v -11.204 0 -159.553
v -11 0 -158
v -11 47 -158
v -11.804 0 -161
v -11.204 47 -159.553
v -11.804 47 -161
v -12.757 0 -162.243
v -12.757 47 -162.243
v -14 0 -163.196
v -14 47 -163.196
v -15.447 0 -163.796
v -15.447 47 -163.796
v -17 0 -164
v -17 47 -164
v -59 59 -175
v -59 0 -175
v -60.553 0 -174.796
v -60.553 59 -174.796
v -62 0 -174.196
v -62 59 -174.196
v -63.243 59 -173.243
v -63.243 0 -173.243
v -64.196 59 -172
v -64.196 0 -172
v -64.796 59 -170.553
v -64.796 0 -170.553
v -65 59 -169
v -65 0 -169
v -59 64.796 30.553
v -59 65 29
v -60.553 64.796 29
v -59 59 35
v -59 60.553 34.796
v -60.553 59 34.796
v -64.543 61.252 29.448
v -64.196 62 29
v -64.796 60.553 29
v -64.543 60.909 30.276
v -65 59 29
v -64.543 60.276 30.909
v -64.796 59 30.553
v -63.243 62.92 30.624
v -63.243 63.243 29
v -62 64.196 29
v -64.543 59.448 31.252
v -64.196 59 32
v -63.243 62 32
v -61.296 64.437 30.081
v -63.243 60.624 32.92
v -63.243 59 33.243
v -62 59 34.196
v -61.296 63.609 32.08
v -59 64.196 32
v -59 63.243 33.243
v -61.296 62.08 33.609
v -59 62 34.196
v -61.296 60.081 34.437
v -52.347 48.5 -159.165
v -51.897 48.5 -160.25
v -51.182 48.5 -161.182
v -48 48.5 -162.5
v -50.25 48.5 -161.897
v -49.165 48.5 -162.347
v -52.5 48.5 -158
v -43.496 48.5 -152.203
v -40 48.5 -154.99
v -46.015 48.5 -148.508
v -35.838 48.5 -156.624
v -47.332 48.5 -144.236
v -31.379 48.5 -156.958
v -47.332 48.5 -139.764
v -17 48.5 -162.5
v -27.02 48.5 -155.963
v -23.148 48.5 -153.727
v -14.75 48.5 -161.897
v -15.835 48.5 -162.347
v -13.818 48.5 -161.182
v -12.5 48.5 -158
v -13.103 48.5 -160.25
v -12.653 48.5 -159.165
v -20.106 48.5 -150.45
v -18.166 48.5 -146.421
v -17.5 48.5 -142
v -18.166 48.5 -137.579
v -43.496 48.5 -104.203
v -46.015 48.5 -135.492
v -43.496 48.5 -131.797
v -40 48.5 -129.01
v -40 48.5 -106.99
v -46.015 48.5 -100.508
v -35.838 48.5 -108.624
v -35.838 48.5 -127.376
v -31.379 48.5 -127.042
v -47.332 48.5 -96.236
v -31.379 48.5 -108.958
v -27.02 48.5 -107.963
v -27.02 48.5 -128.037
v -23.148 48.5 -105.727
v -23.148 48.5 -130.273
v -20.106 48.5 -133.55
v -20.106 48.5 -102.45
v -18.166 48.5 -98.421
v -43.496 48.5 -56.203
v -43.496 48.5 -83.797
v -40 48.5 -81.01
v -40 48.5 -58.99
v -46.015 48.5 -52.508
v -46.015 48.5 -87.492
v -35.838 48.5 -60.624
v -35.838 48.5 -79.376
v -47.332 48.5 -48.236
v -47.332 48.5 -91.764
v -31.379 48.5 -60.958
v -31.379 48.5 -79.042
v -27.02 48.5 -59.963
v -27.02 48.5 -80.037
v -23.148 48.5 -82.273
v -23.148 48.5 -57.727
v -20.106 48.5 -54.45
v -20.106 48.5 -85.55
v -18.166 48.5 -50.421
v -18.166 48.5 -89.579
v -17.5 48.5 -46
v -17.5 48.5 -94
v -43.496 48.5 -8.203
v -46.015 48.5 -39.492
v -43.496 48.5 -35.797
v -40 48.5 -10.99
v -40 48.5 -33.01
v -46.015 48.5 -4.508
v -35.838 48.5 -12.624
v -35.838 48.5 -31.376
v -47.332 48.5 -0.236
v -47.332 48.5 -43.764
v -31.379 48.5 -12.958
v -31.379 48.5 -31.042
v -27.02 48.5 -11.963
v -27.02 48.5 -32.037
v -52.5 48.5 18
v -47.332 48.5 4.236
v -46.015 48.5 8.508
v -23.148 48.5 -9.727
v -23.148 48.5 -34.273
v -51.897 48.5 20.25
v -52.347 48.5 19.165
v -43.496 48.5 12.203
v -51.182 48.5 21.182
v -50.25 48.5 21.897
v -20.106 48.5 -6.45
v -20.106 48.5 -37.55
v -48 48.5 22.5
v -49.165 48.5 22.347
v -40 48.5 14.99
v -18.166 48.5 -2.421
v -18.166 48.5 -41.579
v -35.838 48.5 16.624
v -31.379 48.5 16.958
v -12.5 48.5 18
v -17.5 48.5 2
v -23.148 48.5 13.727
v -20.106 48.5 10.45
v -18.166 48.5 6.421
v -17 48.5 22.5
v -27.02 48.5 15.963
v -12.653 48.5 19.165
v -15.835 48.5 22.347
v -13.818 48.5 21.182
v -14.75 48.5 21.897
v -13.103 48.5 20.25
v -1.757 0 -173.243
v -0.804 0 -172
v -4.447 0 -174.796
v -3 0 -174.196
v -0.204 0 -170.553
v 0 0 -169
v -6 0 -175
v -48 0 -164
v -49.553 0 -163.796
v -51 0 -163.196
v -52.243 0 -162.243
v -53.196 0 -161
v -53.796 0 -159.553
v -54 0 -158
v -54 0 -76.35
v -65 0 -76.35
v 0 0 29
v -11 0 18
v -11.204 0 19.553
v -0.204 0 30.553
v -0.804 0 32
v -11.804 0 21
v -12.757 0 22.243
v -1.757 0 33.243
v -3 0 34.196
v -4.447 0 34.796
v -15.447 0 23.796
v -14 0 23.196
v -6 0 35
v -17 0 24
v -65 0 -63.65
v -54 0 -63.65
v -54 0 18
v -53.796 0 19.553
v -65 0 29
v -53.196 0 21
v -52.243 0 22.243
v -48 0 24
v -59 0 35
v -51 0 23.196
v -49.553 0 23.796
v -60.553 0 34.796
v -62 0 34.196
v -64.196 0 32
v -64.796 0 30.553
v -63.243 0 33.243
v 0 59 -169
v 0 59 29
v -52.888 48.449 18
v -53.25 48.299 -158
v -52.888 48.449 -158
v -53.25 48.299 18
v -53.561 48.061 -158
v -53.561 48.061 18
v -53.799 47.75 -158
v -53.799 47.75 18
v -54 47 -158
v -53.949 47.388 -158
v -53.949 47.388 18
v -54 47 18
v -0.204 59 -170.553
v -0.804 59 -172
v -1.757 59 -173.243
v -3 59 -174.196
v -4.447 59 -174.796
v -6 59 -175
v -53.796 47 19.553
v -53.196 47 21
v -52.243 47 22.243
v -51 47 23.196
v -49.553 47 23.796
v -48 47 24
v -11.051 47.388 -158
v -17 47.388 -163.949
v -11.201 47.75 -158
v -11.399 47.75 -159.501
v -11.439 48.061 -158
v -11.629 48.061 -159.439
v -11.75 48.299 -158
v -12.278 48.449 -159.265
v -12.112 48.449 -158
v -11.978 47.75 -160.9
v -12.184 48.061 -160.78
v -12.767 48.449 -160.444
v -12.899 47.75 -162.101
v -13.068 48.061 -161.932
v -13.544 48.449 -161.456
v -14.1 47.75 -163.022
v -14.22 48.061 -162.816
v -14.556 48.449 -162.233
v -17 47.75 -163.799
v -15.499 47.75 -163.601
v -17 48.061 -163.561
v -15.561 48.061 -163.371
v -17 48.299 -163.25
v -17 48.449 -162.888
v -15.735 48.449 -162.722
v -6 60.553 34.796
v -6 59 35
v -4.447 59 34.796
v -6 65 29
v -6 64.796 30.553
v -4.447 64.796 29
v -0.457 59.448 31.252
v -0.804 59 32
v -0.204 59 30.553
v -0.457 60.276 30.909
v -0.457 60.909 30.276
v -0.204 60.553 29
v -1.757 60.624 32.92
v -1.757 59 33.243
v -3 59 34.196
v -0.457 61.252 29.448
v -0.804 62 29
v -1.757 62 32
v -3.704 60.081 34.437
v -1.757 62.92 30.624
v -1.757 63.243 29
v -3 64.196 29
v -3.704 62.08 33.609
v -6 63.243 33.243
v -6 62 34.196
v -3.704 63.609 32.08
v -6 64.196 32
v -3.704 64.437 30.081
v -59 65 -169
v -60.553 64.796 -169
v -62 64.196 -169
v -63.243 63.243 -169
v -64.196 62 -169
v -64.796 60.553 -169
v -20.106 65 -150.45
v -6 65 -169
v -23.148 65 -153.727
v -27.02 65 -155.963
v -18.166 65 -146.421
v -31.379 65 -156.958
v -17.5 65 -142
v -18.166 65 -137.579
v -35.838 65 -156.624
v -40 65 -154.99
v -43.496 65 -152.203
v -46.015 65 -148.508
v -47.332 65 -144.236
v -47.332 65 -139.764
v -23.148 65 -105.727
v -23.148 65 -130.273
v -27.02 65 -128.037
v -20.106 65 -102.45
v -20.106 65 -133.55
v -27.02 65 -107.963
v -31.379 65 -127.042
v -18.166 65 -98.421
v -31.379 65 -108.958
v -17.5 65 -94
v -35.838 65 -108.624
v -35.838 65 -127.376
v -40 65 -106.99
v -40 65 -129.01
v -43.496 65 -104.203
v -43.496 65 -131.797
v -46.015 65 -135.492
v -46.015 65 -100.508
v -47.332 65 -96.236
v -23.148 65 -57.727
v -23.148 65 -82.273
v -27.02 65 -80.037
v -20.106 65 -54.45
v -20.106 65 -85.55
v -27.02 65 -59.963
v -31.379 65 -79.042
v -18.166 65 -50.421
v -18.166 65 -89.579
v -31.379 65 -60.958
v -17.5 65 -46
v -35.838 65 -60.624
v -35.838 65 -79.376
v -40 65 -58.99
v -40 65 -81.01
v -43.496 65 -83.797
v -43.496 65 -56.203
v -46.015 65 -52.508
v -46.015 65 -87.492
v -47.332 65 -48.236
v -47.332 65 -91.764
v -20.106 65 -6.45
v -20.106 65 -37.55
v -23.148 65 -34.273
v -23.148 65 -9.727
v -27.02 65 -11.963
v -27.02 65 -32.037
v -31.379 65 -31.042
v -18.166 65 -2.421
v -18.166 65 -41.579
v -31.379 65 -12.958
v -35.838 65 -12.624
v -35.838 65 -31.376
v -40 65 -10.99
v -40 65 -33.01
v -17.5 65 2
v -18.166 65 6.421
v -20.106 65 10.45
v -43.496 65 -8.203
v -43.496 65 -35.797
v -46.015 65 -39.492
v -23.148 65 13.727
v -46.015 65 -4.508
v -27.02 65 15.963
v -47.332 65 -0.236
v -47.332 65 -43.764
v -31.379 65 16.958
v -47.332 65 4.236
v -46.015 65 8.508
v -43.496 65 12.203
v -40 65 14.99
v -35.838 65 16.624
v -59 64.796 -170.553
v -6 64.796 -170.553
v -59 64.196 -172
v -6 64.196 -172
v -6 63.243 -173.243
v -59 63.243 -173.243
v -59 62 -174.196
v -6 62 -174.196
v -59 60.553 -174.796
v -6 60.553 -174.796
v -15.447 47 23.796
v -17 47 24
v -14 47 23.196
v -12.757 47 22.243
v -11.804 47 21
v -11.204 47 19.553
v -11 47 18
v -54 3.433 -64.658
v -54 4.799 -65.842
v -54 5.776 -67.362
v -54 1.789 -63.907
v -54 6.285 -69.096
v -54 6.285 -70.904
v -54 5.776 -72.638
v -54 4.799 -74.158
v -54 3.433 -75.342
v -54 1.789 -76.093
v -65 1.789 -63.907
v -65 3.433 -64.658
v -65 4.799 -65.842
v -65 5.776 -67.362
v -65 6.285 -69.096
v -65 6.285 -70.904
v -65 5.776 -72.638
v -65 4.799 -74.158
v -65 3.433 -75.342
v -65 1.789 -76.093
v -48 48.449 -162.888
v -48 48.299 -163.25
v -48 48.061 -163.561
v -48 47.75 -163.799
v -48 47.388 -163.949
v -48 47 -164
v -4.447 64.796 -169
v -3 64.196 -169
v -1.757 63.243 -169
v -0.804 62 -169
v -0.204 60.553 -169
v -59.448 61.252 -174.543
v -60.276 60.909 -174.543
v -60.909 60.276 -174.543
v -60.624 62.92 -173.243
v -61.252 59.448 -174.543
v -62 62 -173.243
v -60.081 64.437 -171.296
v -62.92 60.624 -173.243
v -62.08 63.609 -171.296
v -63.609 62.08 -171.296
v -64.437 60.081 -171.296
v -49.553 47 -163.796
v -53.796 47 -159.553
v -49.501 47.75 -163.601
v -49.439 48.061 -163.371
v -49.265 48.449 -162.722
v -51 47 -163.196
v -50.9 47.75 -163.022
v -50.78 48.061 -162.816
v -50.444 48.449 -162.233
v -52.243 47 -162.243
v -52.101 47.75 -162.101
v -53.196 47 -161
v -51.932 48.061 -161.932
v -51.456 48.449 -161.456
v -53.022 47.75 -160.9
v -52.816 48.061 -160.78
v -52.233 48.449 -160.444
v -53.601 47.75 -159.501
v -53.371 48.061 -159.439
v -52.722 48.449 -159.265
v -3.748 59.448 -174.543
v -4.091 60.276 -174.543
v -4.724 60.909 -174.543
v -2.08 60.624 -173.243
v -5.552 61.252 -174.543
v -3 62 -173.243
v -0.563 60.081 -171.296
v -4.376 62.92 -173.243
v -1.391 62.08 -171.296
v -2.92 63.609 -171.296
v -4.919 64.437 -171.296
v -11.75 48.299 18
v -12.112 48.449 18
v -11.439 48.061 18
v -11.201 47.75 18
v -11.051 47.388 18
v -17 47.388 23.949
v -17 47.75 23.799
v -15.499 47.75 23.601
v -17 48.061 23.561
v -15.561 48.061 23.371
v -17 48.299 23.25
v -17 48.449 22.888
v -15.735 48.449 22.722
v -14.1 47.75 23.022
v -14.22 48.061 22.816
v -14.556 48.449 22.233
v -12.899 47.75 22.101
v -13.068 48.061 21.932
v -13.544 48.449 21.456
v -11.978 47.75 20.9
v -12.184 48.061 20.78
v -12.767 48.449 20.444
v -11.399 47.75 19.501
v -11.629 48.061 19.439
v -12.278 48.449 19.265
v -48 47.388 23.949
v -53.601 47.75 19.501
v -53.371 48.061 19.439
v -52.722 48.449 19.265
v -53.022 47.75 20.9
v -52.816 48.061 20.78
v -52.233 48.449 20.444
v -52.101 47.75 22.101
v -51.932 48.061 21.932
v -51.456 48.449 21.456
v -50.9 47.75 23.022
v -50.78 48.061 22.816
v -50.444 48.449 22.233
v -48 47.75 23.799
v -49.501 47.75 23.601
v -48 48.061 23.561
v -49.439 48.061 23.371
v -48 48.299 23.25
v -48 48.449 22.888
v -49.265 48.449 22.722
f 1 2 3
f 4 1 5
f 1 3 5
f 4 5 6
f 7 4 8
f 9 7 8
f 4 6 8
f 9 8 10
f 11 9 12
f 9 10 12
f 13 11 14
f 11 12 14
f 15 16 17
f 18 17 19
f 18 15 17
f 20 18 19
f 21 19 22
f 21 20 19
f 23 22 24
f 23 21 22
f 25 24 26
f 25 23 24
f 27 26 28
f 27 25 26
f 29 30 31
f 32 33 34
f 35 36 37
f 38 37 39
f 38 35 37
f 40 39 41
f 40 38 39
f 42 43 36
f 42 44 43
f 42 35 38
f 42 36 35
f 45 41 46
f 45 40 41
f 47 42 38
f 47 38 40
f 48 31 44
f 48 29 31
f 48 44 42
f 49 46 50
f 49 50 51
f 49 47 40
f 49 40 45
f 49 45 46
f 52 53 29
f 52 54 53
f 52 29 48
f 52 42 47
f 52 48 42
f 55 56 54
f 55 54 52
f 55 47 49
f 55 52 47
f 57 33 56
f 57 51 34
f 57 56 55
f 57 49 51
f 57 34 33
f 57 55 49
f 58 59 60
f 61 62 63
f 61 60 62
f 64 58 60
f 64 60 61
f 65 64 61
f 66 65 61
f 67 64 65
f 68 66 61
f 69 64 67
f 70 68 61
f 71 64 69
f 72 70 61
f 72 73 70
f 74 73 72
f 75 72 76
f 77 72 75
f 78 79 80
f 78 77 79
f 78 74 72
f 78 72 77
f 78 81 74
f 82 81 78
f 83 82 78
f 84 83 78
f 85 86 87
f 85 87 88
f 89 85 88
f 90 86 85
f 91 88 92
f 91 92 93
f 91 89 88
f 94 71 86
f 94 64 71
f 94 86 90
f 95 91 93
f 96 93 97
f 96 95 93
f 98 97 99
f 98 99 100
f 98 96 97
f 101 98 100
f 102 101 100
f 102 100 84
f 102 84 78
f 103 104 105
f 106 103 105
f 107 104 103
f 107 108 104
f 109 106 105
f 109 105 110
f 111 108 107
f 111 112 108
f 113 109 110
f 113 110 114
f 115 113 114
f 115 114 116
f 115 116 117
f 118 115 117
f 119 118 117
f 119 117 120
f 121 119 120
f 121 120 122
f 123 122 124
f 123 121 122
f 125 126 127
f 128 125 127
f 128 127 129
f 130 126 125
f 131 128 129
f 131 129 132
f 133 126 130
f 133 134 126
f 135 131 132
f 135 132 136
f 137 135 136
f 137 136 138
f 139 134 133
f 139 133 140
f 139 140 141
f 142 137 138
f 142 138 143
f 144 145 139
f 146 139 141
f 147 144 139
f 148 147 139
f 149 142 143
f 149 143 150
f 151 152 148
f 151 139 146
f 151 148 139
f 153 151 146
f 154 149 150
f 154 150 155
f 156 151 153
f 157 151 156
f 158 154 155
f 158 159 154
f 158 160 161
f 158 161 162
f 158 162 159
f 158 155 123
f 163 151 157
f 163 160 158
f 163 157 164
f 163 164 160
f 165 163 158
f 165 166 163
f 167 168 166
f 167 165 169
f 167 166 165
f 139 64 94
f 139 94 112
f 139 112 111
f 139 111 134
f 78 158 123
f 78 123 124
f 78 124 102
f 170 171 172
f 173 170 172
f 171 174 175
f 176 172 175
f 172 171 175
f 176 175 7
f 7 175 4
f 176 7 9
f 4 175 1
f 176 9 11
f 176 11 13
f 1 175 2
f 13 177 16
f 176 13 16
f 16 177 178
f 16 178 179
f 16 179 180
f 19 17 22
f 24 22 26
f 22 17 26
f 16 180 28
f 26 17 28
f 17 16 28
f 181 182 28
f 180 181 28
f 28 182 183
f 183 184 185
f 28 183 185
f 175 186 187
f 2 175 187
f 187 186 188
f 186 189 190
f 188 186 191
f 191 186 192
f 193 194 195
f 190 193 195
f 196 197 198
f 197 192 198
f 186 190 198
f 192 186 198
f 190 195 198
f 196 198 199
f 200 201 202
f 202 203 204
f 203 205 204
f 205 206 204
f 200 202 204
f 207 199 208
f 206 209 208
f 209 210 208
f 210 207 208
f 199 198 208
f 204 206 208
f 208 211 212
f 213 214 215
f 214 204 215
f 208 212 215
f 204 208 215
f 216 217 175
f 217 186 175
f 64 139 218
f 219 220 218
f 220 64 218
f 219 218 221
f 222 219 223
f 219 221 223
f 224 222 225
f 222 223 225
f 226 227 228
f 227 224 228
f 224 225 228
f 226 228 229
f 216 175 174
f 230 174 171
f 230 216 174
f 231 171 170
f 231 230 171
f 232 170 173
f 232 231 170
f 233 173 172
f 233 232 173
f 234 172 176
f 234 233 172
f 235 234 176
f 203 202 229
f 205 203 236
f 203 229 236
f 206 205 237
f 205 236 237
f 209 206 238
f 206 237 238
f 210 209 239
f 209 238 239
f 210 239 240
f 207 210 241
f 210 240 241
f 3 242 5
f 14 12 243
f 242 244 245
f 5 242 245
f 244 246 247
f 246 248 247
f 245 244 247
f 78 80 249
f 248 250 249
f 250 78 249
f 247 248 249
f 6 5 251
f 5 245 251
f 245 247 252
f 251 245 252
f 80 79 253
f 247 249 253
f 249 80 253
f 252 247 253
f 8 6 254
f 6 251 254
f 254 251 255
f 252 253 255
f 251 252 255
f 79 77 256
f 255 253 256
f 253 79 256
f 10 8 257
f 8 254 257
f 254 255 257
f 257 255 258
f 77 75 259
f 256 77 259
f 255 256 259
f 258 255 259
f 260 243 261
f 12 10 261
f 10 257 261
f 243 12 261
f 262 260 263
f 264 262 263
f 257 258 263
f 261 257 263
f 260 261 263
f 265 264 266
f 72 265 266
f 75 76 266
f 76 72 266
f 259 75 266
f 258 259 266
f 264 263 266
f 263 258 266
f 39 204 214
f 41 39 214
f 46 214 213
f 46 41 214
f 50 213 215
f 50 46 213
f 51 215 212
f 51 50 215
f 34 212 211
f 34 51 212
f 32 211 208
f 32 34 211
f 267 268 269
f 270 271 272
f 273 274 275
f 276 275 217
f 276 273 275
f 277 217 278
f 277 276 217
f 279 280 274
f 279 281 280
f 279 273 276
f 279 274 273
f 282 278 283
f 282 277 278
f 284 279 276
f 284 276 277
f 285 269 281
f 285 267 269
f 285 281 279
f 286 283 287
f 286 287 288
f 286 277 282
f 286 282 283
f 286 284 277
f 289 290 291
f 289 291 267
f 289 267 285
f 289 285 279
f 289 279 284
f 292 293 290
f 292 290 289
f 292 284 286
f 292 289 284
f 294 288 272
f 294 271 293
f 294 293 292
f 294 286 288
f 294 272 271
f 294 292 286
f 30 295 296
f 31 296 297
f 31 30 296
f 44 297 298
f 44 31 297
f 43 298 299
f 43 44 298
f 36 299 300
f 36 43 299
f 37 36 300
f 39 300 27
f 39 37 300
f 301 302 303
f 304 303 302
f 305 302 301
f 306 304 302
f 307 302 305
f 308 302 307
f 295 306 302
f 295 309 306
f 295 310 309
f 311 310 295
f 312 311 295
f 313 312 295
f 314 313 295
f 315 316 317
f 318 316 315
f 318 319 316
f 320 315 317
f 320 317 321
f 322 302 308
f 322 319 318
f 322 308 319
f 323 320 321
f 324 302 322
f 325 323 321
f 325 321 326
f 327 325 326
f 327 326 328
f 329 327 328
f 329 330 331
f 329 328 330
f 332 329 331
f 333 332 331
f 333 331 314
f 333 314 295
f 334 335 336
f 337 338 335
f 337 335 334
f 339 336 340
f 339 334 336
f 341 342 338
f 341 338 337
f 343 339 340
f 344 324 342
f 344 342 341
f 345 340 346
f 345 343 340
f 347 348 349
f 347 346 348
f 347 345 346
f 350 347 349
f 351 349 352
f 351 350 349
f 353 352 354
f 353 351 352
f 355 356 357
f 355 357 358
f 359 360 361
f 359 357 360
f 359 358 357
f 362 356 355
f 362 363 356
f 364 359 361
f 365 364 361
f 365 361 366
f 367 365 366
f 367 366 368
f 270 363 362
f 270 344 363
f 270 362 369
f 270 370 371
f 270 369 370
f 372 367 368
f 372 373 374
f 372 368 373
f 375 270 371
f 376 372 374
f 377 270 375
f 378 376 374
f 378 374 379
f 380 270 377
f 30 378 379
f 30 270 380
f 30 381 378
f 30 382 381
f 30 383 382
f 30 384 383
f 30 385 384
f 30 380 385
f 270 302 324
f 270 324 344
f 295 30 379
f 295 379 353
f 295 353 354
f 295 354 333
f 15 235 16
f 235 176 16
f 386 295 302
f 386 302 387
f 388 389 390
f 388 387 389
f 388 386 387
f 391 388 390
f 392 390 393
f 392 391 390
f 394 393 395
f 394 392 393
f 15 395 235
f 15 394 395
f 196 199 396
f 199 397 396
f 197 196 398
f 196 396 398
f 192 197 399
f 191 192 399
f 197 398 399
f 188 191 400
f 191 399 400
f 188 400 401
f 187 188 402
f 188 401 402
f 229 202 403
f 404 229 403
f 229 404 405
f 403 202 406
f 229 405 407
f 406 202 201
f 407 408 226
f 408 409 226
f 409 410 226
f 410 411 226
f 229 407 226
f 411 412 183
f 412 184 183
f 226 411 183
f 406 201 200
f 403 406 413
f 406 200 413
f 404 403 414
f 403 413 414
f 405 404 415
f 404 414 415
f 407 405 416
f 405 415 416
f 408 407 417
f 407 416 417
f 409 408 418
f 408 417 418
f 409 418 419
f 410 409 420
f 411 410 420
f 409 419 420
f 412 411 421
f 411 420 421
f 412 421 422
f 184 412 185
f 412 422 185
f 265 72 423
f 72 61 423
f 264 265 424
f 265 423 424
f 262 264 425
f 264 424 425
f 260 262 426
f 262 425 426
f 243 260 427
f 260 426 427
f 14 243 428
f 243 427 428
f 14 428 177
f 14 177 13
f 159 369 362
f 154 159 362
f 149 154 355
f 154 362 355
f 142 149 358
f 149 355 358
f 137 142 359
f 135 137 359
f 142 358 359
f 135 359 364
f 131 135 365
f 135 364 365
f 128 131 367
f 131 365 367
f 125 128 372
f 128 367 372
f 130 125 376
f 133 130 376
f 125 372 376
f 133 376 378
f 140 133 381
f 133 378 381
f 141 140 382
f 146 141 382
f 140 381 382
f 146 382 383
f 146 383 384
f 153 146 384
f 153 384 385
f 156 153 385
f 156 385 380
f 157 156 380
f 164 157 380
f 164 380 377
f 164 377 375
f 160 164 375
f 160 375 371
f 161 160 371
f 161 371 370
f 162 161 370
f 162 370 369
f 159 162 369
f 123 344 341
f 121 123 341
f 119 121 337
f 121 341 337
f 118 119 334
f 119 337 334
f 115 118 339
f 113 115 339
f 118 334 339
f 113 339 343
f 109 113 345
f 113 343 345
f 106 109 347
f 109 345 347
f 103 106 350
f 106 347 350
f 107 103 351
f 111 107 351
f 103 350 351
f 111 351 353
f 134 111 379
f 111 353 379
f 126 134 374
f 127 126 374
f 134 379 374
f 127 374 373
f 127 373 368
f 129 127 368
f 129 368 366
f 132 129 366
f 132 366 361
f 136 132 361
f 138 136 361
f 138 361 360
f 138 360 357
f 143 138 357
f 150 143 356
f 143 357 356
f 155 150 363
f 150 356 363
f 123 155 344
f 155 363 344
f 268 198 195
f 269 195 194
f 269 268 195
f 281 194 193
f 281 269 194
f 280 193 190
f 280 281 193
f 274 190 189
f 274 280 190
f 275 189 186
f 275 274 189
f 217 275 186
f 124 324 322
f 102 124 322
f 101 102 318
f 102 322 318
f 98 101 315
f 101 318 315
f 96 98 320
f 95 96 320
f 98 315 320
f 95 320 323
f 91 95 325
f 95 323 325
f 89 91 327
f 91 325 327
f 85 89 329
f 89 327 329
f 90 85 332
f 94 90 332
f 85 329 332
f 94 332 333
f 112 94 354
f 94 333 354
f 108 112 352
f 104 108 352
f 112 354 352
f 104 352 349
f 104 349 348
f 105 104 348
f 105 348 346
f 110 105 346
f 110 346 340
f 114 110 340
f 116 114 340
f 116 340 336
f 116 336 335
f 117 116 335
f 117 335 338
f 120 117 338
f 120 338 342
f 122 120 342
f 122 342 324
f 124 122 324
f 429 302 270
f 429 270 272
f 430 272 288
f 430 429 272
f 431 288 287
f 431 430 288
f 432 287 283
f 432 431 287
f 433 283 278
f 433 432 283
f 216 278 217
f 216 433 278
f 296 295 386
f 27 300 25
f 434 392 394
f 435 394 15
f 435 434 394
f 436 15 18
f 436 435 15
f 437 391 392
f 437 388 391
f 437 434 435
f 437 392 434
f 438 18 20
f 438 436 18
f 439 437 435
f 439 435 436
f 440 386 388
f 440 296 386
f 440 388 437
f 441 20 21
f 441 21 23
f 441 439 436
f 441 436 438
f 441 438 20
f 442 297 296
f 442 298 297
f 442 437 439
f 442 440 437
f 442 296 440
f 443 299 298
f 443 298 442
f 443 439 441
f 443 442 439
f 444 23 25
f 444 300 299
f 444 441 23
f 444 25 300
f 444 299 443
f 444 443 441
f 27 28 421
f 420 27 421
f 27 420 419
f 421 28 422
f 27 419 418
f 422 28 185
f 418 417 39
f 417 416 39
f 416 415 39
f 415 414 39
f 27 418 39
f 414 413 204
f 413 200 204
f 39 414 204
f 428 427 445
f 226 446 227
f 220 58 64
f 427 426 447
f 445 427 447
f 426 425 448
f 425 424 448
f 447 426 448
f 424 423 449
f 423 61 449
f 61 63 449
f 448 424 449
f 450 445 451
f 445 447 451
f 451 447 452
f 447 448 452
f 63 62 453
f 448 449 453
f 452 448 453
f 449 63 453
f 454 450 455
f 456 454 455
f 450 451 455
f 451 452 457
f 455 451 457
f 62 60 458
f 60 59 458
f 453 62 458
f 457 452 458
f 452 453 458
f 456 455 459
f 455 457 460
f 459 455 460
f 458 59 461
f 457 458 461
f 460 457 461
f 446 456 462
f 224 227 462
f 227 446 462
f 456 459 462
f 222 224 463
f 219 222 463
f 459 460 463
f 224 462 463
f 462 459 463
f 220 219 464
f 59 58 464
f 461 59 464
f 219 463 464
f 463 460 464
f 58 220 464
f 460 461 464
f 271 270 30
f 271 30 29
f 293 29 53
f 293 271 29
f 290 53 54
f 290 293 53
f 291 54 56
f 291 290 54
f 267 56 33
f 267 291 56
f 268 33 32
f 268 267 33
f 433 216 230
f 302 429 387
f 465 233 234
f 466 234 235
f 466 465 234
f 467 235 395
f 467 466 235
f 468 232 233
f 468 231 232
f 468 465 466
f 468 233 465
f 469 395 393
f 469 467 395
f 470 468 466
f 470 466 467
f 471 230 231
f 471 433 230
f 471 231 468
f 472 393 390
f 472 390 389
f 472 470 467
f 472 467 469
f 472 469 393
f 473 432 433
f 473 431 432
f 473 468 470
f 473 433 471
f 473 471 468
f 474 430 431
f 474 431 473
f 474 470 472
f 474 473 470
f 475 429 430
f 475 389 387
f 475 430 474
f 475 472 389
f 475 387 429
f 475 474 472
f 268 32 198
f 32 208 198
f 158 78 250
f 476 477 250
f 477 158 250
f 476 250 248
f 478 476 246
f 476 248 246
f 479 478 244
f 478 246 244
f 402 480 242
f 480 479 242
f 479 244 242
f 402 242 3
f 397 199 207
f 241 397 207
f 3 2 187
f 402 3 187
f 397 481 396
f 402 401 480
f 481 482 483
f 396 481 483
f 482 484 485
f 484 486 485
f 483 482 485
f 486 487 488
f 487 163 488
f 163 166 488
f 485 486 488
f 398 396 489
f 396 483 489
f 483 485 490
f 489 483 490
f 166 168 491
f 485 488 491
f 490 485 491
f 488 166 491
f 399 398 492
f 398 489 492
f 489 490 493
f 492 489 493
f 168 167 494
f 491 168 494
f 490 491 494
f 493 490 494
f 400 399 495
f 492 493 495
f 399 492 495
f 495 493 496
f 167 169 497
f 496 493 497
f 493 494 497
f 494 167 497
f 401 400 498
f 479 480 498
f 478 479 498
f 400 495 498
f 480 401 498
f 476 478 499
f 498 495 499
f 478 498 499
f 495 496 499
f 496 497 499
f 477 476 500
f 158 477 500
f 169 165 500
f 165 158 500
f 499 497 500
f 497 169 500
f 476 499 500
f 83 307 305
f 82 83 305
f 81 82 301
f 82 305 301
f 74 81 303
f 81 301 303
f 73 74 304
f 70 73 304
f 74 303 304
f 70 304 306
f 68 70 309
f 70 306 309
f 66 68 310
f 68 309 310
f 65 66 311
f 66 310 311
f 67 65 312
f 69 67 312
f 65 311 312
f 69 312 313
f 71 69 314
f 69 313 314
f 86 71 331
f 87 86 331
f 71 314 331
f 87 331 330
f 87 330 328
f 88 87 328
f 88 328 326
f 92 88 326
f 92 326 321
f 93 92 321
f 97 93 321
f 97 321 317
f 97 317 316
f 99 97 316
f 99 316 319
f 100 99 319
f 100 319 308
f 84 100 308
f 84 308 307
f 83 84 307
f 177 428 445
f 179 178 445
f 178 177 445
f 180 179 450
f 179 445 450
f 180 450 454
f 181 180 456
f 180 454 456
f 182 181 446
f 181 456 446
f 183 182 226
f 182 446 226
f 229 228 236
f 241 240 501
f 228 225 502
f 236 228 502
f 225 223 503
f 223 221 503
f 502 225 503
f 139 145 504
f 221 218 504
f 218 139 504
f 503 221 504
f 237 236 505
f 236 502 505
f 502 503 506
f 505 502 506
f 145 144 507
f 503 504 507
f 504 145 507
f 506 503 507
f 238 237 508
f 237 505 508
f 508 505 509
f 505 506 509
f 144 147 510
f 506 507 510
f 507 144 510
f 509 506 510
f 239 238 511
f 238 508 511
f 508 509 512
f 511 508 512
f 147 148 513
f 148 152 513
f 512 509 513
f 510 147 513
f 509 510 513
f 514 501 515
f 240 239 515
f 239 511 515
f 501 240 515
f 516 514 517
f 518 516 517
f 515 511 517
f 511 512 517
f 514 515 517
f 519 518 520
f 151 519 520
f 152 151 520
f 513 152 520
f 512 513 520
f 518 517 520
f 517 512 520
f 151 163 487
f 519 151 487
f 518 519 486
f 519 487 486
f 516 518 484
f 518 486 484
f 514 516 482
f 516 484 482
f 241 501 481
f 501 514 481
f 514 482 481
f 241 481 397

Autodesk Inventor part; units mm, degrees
ref_plane "YZ Plane" through (0, 0, 0) normal (1, 0, 0) x (0, 1, 0)
ref_plane "XZ Plane" through (0, 0, 0) normal (0, 1, 0) x (-1, 0, 0)
ref_plane "XY Plane" through (0, 0, 0) normal (0, 0, 1) x (1, 0, 0)
sketch "Base" plane through (0, 0, 0) normal (0, 1, 0) x (-1, 0, 0)
  line L0 (0, 35) -> (0, -175)
  line L1 (0, -175) -> (65, -175)
  line L2 (65, -175) -> (65, 35)
  line L3 (65, 35) -> (0, 35)
  dimension "d6" = 210
  dimension "d7" = 65
extrude "Extrusion2" add sketch "Base" along normal blind 65
sketch "Top" plane through (0, 65, 0) normal (0, 1, 0) x (1, 0, 0)
  circle A0 centre (-32.5, 46) radius 17
  circle A1 centre (-32.5, -2) radius 17
  circle A2 centre (-32.5, 94) radius 17
  circle A3 centre (-32.5, 142) radius 17
  line L0 (0, 175) -> (-65, 175) projected
  line L1 (-65, 175) -> (-65, -35) projected
  line L2 (-65, -35) -> (0, -35) construction
  line L3 (-32.5, -35) -> (-32.5, 175) construction
  circle A4 centre (-32.5, -2) radius 15
  circle A5 centre (-32.5, 46) radius 15
  circle A6 centre (-32.5, 94) radius 15
  circle A7 centre (-32.5, 142) radius 15
  point P0 (-32.5, 70)
  dimension "d10" = 34
  dimension "d11" = 34
  dimension "d12" = 34
  dimension "d13" = 34
  dimension "d14" = 48
  dimension "d15" = 48
  dimension "d16" = 48
  dimension "d27" = 30
  dimension "d28" = 30
  dimension "d29" = 30
  dimension "d30" = 30
  dimension "d31" = 24
  dimension "d32" = 105
  dimension "d35" = 33
extrude "Extrusion3" cut sketch "Top" against normal up to next contours A4 | A5 | A6 | A7
sketch "Walls" plane through (0, 0, 0) normal (0, -1, 0) x (1, 0, 0)
  line L0 (-11, 24) -> (-54, 24)
  line L1 (-54, 24) -> (-54, -164)
  line L2 (-54, -164) -> (-11, -164)
  line L3 (-11, -164) -> (-11, 24)
  line L4 (-65, 35) -> (0, 35) projected
  line L5 (0, -175) -> (-65, -175) projected
  line L6 (0, 35) -> (0, -175) projected
  line L7 (-65, -175) -> (-65, 35) projected
  point P0 (0, 0)
  dimension "d21" = 11
  dimension "d22" = 11
  dimension "d23" = 11
  dimension "d24" = 11
  dimension "d33" = 43
extrude "Extrusion4" cut sketch "Walls" against normal blind 48.5 contours L3 L2 L1 L0
sketch "Sketch6" plane through (0, 0, 35) normal (1, 0, 0) x (0, 0, -1)
  line L0 (0, 0) -> (210, 0) projected
  line L1 (11, 48.5) -> (199, 48.5) projected
  point P0 (35, 0)
  point P1 (33.3852, 33.5)
  dimension "d34" = 48.5
fillet "Fillet1" radius 6 8 edges at (-32.5, 65, 35) (-65, 65, -70) (0, 65, -70) (0, 32.5, 35) (-65, 32.5, 35) (0, 32.5, -175) (-32.5, 65, -175) (-65, 32.5, -175)
sketch "Sketch7" plane through (-65, 0, -169) normal (-1, 0, 0) x (0, 0, 1)
  line L0 (0, 59) -> (198, 59) projected
  line L1 (99, 59) -> (99, 0) construction
  line L2 (0, 0) -> (198, 0) projected
  circle A0 centre (99, 0) radius 6.35
  point P0 (169, 0)
  dimension "d40" = 12.7
extrude "Extrusion5" cut sketch "Sketch7" against normal up to surface (11 mm away)
fillet "Fillet2" radius 6 4 edges at (-11, 24.25, 24) (-54, 24.25, 24) (-11, 24.25, -164) (-54, 24.25, -164)
sketch "Sketch8" plane through (0, 0, 29) normal (1, 0, 0) x (0, 0, -1)
  line L0 (0, 0) -> (198, 0) projected
  line L1 (198, 65) -> (0, 65) projected
  point P0 (29, 0)
  dimension "d42" = 65
fillet "Fillet3" radius 1.5 8 edges at (-52.2426, 48.5, 22.2426) (-32.5, 48.5, 24) (-12.7574, 48.5, 22.2426) (-11, 48.5, -70) (-12.7574, 48.5, -162.2426) (-32.5, 48.5, -164) (-52.2426, 48.5, -162.2426) (-54, 48.5, -70)
equation "\"d8\" = d7"
equation "\"d11\" = d10"
equation "\"d12\" = d10"
equation "\"d13\" = d10"
equation "\"d15\" = d14"
equation "\"d16\" = d14"
equation "\"d28\" = d27"
equation "\"d29\" = d27"
equation "\"d30\" = d27"
equation "\"d31\" = 0.5 * d14"
equation "\"d32\" = 0.5 * d6"
equation "\"d22\" = d21"
equation "\"d23\" = d21"
equation "\"d24\" = d23"
equation "\"d25\" = d7 - 1.5 * d21"
equation "\"d41\" = d36"
equation "\"d43\" = 0.25 * d36"
equation "\"d36\" = 6"
properties part number "Full"
